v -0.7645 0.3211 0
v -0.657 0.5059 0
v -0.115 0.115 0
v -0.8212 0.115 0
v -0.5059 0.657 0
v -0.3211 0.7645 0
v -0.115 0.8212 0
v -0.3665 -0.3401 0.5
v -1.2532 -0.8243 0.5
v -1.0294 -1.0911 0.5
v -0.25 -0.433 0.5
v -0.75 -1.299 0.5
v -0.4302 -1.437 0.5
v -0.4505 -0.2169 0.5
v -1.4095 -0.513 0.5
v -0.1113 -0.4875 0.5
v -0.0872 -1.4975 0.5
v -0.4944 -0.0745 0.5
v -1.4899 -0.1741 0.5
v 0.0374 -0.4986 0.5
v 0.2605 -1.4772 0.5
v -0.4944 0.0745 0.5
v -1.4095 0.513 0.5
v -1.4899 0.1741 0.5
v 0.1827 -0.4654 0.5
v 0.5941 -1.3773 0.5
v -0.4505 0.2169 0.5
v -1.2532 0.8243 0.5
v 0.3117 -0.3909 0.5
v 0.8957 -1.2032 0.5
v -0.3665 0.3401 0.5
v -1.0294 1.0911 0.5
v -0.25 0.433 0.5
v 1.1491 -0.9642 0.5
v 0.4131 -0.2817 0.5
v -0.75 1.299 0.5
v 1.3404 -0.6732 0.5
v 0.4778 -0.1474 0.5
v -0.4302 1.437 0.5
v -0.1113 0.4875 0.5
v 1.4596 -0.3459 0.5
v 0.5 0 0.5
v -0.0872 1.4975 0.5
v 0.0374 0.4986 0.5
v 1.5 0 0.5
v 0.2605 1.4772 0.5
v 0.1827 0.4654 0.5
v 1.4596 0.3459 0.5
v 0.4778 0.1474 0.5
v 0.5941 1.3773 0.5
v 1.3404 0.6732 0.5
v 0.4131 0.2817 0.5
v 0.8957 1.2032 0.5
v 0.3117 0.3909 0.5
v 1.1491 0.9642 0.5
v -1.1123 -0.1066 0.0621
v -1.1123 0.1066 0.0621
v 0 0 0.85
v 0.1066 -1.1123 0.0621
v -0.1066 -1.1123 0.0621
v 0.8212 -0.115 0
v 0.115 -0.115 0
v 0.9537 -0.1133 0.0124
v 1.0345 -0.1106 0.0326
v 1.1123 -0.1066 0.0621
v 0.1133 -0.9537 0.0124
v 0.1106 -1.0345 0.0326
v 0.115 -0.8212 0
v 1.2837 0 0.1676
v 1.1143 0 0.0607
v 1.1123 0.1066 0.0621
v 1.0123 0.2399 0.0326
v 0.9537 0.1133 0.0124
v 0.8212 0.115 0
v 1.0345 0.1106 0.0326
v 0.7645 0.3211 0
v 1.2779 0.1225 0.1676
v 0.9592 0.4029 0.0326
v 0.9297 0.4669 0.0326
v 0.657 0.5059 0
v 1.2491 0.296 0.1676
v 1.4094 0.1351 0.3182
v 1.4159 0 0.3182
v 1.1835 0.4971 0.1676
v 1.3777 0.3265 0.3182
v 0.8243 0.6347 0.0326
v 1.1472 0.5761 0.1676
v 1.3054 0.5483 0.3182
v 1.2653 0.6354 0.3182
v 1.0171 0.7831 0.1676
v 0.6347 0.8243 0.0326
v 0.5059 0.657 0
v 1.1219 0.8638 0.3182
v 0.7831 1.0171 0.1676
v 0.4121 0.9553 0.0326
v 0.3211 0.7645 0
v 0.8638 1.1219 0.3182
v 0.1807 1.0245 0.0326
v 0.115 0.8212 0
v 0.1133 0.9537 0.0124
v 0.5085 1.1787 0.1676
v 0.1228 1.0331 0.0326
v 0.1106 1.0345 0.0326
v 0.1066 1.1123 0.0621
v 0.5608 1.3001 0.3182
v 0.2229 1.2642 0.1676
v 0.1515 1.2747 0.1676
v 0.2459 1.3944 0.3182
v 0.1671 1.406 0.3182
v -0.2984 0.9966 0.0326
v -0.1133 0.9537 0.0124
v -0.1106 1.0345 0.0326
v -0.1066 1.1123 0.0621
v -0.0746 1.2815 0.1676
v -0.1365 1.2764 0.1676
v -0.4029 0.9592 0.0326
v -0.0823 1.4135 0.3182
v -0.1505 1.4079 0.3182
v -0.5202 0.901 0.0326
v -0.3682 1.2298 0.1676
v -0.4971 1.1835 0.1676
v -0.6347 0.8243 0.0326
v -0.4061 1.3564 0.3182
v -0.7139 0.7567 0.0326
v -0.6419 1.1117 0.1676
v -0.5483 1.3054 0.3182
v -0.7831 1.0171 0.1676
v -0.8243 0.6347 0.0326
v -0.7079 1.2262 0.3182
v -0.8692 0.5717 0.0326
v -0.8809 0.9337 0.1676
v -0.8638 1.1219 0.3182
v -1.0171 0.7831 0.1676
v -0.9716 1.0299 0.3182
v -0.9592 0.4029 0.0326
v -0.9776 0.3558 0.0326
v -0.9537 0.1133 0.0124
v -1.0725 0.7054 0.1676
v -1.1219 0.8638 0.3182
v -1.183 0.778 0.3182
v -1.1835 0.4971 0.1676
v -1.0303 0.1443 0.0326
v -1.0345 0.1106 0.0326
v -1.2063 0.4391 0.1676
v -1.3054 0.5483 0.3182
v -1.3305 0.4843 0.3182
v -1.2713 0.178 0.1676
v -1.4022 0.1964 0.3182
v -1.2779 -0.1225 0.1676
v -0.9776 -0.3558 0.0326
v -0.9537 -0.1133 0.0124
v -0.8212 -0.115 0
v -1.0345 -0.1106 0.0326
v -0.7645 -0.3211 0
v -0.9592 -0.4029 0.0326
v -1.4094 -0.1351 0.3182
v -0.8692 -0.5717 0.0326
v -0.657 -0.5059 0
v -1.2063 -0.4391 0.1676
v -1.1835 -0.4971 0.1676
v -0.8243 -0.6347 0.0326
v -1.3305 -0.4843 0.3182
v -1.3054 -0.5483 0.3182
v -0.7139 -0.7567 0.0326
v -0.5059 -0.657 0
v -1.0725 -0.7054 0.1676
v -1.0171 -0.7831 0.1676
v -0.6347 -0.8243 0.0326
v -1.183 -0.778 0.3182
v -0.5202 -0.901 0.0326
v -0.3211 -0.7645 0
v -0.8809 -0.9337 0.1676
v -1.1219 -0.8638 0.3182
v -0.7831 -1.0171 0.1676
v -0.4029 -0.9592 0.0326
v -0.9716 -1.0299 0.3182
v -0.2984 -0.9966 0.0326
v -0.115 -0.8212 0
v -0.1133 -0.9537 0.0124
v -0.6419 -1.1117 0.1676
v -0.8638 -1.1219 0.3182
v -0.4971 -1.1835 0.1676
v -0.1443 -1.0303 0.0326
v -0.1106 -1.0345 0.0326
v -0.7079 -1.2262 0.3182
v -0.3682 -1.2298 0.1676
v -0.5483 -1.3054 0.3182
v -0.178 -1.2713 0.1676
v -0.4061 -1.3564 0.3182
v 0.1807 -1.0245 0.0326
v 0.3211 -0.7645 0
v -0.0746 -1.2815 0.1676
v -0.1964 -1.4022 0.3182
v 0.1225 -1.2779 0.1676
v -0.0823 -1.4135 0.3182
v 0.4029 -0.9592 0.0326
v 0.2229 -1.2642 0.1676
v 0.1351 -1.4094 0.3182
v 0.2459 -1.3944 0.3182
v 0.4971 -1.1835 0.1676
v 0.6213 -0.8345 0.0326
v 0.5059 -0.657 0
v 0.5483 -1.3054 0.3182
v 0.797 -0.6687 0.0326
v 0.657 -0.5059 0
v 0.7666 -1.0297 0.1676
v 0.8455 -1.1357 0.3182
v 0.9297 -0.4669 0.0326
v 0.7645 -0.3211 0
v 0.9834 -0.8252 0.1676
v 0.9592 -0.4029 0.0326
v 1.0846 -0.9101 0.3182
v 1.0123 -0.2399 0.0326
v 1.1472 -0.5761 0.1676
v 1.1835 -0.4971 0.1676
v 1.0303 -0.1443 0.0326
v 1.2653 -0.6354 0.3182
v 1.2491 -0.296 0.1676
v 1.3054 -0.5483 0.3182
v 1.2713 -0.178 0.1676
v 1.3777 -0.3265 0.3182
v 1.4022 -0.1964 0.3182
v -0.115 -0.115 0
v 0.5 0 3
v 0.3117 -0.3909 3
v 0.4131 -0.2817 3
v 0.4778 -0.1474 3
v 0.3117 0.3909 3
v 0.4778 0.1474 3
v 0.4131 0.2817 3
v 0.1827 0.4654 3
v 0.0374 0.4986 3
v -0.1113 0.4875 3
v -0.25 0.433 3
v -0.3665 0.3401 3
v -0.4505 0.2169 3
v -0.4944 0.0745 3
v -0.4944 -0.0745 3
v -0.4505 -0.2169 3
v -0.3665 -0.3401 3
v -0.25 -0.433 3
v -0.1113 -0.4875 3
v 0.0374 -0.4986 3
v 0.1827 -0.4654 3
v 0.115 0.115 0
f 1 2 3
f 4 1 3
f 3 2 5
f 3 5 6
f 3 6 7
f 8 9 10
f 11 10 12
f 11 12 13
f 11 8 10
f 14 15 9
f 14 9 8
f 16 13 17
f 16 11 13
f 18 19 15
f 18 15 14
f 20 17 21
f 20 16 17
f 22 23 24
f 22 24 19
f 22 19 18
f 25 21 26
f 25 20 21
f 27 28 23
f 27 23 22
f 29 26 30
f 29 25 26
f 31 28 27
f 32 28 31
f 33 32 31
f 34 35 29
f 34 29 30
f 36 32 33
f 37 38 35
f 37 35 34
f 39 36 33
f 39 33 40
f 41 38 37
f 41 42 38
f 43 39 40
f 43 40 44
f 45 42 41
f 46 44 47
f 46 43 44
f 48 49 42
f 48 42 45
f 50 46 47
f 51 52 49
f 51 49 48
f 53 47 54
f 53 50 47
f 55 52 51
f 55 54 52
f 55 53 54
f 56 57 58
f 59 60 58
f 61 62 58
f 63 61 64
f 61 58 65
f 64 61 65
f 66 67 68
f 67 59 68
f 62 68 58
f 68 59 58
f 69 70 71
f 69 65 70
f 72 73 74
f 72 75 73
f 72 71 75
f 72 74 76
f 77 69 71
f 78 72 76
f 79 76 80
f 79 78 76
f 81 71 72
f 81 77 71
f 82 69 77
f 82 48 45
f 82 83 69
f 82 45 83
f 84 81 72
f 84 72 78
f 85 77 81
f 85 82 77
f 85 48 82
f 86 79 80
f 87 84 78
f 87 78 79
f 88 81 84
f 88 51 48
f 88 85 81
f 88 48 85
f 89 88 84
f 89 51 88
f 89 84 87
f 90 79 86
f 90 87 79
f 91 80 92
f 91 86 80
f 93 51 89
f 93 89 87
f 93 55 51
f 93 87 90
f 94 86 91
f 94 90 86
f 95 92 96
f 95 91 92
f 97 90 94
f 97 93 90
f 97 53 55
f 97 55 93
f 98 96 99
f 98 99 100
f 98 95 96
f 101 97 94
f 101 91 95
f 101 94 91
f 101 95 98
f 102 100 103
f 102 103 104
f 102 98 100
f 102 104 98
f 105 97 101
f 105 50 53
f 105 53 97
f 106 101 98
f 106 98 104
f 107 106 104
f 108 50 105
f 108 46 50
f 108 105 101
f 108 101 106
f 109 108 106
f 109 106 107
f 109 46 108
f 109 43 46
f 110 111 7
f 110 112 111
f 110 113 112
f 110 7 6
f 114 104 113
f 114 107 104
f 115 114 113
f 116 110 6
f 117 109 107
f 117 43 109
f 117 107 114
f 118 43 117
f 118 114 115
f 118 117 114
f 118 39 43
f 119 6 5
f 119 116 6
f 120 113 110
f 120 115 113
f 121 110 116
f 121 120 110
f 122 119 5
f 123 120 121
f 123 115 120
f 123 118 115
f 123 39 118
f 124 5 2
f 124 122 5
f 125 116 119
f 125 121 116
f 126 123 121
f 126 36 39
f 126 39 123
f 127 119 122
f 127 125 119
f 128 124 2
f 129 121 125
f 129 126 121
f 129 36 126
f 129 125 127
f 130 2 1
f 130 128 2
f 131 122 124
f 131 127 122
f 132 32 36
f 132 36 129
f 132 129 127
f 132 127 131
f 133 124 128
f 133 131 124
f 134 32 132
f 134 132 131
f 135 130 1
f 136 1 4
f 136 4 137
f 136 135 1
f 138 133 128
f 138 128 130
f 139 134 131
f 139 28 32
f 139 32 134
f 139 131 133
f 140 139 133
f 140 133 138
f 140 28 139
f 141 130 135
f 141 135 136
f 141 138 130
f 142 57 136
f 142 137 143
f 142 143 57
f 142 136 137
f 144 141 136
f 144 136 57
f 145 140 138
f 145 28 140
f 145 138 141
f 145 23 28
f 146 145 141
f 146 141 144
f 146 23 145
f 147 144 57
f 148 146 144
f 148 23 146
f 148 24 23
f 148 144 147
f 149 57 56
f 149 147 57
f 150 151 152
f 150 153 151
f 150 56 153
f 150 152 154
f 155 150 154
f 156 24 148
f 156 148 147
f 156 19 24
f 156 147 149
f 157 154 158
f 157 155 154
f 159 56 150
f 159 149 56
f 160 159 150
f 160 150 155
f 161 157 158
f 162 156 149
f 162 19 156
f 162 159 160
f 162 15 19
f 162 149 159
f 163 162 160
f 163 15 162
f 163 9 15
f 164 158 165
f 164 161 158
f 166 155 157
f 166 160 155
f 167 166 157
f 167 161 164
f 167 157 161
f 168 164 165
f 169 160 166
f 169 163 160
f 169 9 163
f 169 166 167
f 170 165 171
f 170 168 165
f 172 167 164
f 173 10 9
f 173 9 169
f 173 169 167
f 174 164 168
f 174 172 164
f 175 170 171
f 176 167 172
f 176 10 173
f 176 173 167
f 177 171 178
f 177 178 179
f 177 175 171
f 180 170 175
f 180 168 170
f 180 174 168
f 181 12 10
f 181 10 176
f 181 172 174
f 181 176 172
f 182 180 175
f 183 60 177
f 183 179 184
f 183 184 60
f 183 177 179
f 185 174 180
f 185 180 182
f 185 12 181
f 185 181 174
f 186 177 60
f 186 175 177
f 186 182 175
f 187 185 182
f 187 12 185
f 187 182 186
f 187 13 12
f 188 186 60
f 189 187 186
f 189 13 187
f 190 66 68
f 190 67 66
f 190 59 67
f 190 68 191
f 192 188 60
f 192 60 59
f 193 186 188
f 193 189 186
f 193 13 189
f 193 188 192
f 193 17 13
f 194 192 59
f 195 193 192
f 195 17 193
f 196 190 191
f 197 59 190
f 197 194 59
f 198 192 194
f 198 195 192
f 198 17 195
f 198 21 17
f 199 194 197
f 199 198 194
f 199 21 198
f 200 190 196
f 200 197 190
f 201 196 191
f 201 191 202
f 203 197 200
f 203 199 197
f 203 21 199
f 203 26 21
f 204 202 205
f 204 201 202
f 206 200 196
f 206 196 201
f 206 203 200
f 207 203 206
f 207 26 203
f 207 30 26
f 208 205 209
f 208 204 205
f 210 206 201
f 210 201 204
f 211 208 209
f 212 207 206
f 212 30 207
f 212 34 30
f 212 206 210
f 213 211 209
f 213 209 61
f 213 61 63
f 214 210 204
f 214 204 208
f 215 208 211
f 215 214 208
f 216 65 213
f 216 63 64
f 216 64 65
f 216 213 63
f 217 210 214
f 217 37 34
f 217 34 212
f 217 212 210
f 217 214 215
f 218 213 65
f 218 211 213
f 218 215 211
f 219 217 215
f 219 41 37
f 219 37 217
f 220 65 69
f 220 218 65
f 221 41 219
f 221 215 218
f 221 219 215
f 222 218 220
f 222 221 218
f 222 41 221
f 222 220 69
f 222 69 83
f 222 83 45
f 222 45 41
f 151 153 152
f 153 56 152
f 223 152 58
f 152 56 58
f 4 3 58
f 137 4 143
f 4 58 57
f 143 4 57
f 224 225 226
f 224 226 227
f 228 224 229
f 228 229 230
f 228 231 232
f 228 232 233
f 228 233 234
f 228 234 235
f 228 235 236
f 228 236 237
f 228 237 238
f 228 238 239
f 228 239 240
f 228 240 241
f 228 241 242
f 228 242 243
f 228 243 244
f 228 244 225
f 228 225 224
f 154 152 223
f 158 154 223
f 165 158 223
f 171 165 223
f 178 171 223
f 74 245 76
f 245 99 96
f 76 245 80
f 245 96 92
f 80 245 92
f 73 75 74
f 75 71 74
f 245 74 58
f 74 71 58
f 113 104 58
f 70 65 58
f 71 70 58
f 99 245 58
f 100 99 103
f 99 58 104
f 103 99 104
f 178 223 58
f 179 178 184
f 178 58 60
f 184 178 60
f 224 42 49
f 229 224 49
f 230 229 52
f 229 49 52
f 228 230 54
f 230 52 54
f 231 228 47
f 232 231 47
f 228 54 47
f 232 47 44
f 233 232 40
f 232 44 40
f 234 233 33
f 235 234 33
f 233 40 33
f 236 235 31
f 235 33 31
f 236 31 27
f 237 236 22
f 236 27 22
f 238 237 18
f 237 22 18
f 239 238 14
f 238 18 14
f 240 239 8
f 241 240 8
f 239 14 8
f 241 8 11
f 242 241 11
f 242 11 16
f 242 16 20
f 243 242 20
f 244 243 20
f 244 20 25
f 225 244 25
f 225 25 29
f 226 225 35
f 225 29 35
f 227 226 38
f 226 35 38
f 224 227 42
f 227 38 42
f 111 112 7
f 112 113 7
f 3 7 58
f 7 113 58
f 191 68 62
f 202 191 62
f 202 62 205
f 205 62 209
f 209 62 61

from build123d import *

# Parameters (mm, degrees)
SKETCH_1_R               = 1.5
EXTRUDE_1_DEPTH          = 0.5
SKETCH_2_R               = 0.5
EXTRUDE_2_DEPTH          = 2.5
PATTERN_CIRCULAR_1_COUNT = 4
FILLET_2_R               = 0.7


with BuildPart() as part:
    # 草圖1 → 伸長1 (new body)
    with BuildSketch(Plane.XY):
        Circle(SKETCH_1_R)
    extrude(amount=EXTRUDE_1_DEPTH)

    # 草圖2 → 伸長2 (add)
    with BuildSketch(Plane.XY.offset(0.5)):
        Circle(SKETCH_2_R)
    extrude(amount=EXTRUDE_2_DEPTH)

    # 草圖3 → 除料-疊層拉伸1 section 0
    with BuildSketch(Plane(origin=(0, 0, 0), x_dir=(-1, 0, 0), z_dir=(0, 0, -1)), mode=Mode.PRIVATE) as loft_1_s0:
        with BuildLine():
            Line((-0.115, 1.2), (0.115, 1.2))
            Line((0.115, 1.2), (0.115, -1.2))
            Line((0.115, -1.2), (-0.115, -1.2))
            Line((-0.115, -1.2), (-0.115, 1.2))
        make_face()
    loft_1 = loft([loft_1_s0.sketch, Vertex(0, 0, 0.85)], mode=Mode.SUBTRACT)

    # 環狀複製排列1: 除料-疊層拉伸1 ×4 about axis
    pattern_circular_1_axis = Axis((0, 0, 0), (0, 0, 1))
    for i in range(1, PATTERN_CIRCULAR_1_COUNT):
        add(loft_1.rotate(pattern_circular_1_axis, i * 360 / PATTERN_CIRCULAR_1_COUNT), mode=Mode.SUBTRACT)

    # 圓角2
    # the kernel refuses this fillet: 0.7 mm, written as the material it takes off along each edge
    with BuildSketch(Plane(origin=(0, 0, 0), x_dir=(1, 0, 0), z_dir=(0, -1, 0))) as fillet_2_piece_1:
        with BuildLine():
            CenterArc((0.829179607, 0.7), FILLET_2_R, 270, 73.398450401)
            Line((0.829179607, 0), (0.829179607, -0.014))
            Line((0.829179607, -0.014), (1.5, -0.014))
            Line((1.5, -0.014), (1.514, 0))
            ThreePointArc((1.514, 0), (1.514, 0.25), (1.513416408, 0.496))
            Line((1.513416408, 0.496), (1.5, 0.5))
        make_face()
    revolve(axis=Axis((0, 0, 0), (0, 0, 1)), mode=Mode.SUBTRACT)


solid = part.part
